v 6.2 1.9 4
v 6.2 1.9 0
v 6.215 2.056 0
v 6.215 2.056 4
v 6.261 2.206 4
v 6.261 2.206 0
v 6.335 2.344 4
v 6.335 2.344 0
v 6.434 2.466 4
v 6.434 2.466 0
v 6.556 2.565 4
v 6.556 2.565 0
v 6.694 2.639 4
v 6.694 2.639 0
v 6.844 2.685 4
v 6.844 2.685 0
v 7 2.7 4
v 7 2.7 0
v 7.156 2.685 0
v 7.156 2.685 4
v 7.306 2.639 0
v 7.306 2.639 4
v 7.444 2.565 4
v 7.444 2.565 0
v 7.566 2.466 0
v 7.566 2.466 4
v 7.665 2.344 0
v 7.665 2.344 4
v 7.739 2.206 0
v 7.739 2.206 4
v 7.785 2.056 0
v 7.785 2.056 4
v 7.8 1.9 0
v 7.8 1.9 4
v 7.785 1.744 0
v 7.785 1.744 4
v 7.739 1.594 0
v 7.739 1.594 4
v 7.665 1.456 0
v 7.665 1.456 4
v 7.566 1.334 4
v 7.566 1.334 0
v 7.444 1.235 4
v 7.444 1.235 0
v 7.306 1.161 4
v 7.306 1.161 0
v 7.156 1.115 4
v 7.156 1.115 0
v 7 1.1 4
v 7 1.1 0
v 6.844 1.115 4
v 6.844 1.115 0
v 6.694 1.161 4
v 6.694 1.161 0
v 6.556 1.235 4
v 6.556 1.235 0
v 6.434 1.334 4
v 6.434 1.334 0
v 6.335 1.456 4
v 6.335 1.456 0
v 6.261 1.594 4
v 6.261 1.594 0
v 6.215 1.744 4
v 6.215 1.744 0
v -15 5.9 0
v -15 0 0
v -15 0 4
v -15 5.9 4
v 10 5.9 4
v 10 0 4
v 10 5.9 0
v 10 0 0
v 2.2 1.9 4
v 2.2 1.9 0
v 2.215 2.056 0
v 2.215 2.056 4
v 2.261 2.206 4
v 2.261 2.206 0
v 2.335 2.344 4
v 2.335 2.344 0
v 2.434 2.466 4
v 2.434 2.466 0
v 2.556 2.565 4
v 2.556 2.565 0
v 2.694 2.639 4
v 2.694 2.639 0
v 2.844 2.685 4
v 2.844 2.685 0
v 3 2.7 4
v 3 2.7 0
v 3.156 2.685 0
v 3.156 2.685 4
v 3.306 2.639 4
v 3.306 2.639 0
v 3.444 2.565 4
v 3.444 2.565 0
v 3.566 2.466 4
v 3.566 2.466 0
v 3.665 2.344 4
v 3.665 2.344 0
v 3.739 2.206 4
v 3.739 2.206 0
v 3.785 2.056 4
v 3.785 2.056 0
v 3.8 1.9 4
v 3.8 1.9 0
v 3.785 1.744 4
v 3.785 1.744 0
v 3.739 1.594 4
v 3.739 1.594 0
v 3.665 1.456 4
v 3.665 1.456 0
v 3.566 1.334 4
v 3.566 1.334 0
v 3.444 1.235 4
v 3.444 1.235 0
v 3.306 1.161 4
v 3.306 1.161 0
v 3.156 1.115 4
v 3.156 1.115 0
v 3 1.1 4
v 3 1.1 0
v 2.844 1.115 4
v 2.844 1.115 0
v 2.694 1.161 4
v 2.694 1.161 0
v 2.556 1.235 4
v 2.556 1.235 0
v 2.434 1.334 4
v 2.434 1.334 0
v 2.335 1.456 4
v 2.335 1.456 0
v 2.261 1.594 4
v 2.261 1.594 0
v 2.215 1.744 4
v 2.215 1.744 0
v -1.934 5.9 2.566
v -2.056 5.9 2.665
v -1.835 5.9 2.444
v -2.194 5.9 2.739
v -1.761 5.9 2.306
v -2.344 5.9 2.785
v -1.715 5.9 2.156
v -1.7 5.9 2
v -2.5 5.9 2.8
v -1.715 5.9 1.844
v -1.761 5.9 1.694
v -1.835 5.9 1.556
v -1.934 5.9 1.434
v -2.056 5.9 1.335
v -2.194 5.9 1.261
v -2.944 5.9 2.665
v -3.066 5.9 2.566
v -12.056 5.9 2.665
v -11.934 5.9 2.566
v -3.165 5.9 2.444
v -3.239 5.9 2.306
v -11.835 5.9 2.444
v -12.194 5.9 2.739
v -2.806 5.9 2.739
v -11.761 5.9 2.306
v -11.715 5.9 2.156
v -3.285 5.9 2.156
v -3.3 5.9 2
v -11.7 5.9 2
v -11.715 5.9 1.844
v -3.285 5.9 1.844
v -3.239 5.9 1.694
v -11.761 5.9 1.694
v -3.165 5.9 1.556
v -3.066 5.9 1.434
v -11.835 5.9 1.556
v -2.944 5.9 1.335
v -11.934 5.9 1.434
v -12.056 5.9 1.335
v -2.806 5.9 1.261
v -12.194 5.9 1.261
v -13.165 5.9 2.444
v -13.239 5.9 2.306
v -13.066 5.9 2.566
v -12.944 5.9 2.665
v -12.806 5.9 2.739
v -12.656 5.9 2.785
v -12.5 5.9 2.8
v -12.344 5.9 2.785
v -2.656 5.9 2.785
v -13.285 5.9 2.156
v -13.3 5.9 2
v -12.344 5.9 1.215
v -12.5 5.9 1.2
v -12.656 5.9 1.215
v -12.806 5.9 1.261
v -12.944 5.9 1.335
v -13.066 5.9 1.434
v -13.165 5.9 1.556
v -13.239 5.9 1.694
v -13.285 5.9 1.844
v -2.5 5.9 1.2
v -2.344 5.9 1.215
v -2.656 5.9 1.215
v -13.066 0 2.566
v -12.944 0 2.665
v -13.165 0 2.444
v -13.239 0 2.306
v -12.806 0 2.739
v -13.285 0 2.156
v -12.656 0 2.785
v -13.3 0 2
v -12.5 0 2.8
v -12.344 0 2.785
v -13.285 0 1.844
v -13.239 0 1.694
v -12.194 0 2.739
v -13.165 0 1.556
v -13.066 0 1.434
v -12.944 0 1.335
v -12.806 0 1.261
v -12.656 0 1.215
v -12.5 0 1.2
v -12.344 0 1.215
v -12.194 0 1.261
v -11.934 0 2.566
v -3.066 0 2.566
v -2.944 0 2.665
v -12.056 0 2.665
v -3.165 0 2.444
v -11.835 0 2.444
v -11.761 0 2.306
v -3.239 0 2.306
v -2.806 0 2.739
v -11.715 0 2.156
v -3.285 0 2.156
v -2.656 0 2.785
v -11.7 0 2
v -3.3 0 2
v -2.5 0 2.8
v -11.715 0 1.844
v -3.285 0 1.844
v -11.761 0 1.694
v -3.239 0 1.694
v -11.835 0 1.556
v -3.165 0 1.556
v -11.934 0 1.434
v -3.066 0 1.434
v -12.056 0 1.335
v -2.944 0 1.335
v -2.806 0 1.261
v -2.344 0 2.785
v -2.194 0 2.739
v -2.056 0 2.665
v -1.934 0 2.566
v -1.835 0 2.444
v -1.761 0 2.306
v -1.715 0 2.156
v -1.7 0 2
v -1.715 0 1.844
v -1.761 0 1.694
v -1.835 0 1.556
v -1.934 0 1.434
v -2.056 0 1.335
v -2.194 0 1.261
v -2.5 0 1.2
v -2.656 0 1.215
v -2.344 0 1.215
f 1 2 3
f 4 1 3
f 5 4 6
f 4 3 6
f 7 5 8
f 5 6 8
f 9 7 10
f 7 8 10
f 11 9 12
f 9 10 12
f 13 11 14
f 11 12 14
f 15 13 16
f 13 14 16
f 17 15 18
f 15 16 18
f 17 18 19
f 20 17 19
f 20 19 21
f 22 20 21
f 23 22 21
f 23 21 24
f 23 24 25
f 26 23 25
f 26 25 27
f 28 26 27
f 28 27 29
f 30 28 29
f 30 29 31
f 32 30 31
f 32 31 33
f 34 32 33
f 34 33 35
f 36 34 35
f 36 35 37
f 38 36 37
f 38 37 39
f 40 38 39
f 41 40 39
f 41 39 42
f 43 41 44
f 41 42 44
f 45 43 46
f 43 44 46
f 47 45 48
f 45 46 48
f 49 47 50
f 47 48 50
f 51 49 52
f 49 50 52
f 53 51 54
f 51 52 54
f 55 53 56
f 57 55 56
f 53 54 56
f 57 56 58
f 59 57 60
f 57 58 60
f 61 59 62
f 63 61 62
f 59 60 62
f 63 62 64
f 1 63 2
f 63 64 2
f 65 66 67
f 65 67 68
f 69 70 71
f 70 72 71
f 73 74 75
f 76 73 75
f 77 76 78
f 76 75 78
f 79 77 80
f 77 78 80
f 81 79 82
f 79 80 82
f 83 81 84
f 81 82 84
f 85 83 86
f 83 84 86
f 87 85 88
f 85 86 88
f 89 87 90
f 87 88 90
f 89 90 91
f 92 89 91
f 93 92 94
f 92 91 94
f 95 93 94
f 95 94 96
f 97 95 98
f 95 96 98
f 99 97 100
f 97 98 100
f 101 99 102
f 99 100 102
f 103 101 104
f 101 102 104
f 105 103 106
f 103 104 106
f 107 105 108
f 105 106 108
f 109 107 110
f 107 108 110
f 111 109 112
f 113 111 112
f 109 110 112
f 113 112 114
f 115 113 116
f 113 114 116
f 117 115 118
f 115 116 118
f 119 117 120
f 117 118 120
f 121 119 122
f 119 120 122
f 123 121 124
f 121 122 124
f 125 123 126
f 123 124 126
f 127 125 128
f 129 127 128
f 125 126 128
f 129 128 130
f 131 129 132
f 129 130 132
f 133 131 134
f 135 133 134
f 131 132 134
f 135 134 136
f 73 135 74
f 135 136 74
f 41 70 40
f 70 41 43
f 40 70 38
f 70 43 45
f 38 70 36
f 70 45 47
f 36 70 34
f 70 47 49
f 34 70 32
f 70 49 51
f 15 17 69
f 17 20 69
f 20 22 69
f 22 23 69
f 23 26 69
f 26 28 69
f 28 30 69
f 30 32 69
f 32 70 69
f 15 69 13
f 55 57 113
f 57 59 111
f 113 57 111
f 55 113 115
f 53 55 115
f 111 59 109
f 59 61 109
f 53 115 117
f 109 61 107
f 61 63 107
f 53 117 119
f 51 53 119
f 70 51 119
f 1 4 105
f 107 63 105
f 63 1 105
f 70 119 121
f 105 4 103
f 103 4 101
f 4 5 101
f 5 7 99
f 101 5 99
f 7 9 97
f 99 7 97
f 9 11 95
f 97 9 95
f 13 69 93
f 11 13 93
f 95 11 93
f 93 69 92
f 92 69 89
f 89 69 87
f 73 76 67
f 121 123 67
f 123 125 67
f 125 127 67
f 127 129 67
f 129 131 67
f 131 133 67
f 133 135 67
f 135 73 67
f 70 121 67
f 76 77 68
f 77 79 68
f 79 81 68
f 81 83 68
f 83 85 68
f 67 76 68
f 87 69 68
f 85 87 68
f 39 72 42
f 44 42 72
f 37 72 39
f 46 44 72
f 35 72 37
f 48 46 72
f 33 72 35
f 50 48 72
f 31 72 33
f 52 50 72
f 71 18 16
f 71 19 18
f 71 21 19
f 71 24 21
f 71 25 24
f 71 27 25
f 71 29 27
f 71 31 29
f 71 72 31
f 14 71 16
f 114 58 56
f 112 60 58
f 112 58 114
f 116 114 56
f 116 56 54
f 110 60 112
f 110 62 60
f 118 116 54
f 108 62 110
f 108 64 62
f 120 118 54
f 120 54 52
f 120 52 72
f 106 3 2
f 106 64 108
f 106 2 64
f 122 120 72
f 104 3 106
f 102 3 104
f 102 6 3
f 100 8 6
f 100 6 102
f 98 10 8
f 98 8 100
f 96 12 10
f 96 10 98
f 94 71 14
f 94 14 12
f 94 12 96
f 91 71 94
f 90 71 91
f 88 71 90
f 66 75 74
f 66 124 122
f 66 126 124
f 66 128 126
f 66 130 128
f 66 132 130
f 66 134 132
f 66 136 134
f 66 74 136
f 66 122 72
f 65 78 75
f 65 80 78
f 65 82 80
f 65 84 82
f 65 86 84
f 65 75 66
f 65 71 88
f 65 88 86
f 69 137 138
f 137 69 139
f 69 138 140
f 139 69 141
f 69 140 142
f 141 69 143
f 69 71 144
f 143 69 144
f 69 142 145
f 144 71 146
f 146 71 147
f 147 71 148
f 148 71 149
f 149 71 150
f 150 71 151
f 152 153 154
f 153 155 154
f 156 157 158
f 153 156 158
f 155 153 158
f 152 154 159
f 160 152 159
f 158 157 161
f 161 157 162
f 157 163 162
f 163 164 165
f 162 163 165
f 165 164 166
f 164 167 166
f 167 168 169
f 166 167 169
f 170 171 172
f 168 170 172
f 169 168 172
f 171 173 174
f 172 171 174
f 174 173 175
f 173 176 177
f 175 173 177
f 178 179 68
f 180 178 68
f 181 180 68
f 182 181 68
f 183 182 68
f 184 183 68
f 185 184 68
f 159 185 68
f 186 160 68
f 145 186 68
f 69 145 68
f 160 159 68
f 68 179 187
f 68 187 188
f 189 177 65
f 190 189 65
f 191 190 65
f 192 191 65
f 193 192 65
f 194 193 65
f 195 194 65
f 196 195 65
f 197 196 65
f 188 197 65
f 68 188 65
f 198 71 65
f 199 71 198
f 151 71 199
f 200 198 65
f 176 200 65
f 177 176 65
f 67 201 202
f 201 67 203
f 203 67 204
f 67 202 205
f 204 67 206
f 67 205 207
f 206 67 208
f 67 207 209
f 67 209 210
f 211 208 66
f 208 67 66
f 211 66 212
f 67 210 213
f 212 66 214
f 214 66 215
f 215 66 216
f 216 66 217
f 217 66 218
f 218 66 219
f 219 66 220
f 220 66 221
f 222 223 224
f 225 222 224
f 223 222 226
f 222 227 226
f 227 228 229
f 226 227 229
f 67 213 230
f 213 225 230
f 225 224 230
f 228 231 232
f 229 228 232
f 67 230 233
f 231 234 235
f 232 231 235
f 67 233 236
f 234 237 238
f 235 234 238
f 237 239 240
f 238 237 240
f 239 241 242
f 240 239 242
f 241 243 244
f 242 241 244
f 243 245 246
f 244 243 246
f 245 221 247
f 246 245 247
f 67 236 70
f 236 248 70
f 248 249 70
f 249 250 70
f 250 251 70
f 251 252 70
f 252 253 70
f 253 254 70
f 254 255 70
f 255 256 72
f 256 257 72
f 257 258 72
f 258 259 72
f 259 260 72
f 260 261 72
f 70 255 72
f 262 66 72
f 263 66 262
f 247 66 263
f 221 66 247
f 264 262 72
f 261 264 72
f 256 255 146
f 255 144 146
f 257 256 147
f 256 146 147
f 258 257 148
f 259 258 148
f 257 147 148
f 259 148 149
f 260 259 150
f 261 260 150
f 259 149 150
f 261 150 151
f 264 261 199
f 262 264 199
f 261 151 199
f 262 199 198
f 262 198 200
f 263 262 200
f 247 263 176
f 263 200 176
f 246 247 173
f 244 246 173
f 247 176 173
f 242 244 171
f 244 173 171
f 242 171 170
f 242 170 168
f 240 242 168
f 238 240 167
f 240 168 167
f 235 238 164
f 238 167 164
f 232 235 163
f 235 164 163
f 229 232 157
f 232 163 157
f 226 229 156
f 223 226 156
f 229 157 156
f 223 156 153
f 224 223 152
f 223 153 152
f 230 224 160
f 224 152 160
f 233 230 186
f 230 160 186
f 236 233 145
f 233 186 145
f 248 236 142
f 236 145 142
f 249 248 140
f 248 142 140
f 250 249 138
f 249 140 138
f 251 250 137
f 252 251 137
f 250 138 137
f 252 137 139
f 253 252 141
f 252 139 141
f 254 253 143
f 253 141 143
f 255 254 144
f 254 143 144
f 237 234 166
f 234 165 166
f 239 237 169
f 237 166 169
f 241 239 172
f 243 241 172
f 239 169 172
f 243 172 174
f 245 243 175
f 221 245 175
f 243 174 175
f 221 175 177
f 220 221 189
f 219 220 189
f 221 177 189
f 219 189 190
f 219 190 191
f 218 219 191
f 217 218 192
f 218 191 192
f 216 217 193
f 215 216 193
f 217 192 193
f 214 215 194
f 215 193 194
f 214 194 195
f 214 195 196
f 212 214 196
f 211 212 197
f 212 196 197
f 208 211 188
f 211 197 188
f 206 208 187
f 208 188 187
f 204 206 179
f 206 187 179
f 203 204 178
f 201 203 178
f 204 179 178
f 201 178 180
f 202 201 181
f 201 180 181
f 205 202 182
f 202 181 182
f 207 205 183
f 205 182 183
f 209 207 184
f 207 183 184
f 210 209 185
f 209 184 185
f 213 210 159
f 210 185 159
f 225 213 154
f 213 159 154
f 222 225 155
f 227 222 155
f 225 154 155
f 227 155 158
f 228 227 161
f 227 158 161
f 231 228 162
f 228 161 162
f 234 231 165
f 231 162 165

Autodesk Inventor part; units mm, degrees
ref_plane "YZ Plane" through (0, 0, 0) normal (1, 0, 0) x (0, 1, 0)
ref_plane "XZ Plane" through (0, 0, 0) normal (0, 1, 0) x (-1, 0, 0)
ref_plane "XY Plane" through (0, 0, 0) normal (0, 0, 1) x (1, 0, 0)
sketch "Sketch1" plane through (0, 0, 0) normal (0, 0, 1) x (1, 0, 0)
  line L0 (0, 0) -> (-15, 0)
  line L1 (-15, 0) -> (-15, 5.9)
  line L2 (-15, 5.9) -> (0, 5.9)
  line L3 (0, 5.9) -> (0, 0)
  dimension "d0" = 5.9
  dimension "d1" = 15
extrude "Extrusion1" add sketch "Sketch1" along normal blind 4
sketch "Sketch2" plane through (-15, 5.9, 0) normal (0, 1, 0) x (1, 0, 0)
  circle A0 centre (12.5, -2) radius 0.8
  circle A1 centre (2.5, -2) radius 0.8
  line L0 (15, 0) -> (15, -4) projected
  line L1 (15, -4) -> (0, -4) projected
  dimension "d4" = 10
  dimension "d5" = 2.5
  dimension "d6" = 2
  dimension "d7" = 2
  dimension "d8" = 1.6
  dimension "d9" = 1.6
extrude "Extrusion2" cut sketch "Sketch2" against normal blind 8
sketch "Sketch3" plane through (0, 0, 0) normal (0, 0, -1) x (-1, 0, 0)
  line L0 (0, 0) -> (0, 5.9) projected
  line L1 (0, 0) -> (-10, 0)
  line L2 (-10, 0) -> (-10, 5.9)
  line L3 (-10, 5.9) -> (0, 5.9)
  line L4 (0, 5.9) -> (0, 0)
  dimension "d12" = 10
extrude "Extrusion3" add sketch "Sketch3" against normal blind 4
sketch "Sketch4" plane through (0, 0, 0) normal (0, 0, -1) x (-1, 0, 0)
  line L0 (3.3, 5.9) -> (3.3, 0) projected
  line L1 (1.7, 5.9) -> (1.7, 0) projected
  circle A0 centre (-3, 1.9) radius 0.8
  circle A1 centre (-7, 1.9) radius 0.8
  line L2 (-10, 5.9) -> (15, 5.9) projected
  line L3 (15, 0) -> (-10, 0) projected
  line L4 (-10, 5.9) -> (-10, 0) projected
  point P0 (0, 0)
  dimension "d15" = 1.6
  dimension "d16" = 5.9
  dimension "d17" = 4
  dimension "d18" = 4
  dimension "d19" = 4
  dimension "d20" = 3
  dimension "d21" = 1.6
  dimension "d22" = 1.6
extrude "Extrusion4" cut sketch "Sketch4" against normal blind 4 contours A0 | A1
equation "\"d7\" = d6"
equation "\"d18\" = d17"
equation "\"d21\" = d15"
equation "\"d22\" = d15"
properties part number "AngleScrewBlocActuator"
